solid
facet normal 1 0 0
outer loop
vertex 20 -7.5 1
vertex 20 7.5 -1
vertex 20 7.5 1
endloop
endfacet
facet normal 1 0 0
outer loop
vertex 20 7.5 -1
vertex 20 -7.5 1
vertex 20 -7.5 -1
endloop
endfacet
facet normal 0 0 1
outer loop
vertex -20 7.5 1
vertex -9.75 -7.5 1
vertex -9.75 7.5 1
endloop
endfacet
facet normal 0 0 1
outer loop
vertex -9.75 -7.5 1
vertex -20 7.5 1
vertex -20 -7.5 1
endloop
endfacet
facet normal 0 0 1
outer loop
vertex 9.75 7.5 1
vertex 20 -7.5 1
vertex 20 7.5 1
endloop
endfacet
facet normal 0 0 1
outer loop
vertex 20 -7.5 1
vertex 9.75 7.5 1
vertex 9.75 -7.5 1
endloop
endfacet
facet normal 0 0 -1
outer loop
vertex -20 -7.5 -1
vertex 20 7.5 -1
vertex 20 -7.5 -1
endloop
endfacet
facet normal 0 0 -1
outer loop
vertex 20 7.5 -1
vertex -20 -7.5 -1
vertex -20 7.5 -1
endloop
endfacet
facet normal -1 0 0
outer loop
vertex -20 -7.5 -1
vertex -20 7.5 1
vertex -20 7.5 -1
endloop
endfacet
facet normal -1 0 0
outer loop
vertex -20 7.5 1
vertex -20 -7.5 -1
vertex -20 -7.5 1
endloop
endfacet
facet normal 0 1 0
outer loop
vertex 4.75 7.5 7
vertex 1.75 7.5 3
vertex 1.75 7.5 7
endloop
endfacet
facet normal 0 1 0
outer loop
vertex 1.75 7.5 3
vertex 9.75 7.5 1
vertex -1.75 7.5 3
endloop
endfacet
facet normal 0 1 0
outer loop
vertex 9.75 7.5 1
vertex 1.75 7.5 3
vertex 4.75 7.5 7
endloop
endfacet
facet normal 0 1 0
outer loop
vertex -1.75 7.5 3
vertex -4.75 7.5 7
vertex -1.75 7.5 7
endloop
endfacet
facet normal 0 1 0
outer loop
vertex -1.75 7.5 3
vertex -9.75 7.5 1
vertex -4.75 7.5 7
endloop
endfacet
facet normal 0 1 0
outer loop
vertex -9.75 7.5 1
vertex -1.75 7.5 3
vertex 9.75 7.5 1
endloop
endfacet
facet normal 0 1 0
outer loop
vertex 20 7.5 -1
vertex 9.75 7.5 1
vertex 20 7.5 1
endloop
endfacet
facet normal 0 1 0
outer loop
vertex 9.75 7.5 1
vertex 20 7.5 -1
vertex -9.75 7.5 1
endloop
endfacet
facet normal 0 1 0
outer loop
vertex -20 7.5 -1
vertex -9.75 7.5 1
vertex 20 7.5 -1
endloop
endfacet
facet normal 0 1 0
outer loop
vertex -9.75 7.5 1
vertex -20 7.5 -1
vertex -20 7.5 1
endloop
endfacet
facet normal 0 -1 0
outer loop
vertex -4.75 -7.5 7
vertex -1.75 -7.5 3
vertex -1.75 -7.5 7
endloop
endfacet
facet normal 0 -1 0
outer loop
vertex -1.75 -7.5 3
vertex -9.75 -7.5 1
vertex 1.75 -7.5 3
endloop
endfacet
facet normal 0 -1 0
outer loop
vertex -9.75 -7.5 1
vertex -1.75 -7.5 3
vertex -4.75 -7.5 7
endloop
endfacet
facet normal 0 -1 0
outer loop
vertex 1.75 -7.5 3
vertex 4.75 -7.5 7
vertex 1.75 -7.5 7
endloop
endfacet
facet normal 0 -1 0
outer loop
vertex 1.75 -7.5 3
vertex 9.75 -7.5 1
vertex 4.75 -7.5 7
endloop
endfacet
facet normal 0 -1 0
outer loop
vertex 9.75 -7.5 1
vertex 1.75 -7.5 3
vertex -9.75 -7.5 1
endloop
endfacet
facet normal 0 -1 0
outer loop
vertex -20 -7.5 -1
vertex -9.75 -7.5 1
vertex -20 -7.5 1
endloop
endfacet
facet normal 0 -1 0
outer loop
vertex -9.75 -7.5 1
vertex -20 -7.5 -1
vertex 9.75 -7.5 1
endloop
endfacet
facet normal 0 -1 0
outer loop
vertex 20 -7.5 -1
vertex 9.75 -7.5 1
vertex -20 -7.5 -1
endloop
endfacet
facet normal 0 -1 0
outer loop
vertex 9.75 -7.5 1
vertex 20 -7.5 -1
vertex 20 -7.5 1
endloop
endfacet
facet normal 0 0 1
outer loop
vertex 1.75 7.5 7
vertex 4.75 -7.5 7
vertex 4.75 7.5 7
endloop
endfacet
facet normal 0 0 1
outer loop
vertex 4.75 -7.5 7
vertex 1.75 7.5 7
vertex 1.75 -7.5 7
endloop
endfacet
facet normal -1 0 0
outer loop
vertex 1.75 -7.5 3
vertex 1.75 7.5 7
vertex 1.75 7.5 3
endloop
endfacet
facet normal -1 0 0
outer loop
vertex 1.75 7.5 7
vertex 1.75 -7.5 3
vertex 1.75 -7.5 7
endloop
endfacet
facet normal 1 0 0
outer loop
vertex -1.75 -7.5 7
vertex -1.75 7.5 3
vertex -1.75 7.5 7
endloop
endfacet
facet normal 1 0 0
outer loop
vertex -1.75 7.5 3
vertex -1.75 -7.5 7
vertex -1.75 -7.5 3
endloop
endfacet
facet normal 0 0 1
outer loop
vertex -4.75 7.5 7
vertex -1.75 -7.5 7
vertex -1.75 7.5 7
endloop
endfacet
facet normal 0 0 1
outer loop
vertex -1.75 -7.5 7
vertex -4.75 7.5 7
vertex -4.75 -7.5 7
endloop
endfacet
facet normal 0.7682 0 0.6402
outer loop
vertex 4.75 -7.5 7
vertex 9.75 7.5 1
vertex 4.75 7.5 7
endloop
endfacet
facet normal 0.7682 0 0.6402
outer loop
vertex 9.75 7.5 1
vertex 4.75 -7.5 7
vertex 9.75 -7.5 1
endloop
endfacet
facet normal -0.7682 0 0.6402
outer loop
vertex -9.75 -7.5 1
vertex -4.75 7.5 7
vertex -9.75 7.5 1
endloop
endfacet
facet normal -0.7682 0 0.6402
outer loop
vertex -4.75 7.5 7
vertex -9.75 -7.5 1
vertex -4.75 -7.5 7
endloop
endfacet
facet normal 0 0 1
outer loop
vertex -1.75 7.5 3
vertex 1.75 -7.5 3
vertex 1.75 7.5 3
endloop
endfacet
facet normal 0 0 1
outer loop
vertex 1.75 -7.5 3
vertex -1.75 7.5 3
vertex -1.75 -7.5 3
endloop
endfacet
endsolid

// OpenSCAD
module triangle(l, w, h) {
    polyhedron(
        points=[[0,0,0], [l,0,0], [l,w,0], [0,w,0], [0,w,h], [l,w,h]],
        faces=[[0,1,2,3],[5,4,3,2],[0,4,5,1],[0,3,4],[5,2,1]]
    );
}

cube([40, 15, 2], true);
translate([1.75 + 1.5, 0, 4]) cube([3, 15, 6], true);
translate([-1.75 + -1.5, 0, 4]) cube([3, 15, 6], true);

rotate(90) translate([-7.5,-4.5 - 5.25,1]) triangle(15,5,6);
rotate(-90) translate([-7.5,-4.5 - 5.25,1]) triangle(15,5,6);

translate([0,0,2]) cube([3.5,15,2], true);
